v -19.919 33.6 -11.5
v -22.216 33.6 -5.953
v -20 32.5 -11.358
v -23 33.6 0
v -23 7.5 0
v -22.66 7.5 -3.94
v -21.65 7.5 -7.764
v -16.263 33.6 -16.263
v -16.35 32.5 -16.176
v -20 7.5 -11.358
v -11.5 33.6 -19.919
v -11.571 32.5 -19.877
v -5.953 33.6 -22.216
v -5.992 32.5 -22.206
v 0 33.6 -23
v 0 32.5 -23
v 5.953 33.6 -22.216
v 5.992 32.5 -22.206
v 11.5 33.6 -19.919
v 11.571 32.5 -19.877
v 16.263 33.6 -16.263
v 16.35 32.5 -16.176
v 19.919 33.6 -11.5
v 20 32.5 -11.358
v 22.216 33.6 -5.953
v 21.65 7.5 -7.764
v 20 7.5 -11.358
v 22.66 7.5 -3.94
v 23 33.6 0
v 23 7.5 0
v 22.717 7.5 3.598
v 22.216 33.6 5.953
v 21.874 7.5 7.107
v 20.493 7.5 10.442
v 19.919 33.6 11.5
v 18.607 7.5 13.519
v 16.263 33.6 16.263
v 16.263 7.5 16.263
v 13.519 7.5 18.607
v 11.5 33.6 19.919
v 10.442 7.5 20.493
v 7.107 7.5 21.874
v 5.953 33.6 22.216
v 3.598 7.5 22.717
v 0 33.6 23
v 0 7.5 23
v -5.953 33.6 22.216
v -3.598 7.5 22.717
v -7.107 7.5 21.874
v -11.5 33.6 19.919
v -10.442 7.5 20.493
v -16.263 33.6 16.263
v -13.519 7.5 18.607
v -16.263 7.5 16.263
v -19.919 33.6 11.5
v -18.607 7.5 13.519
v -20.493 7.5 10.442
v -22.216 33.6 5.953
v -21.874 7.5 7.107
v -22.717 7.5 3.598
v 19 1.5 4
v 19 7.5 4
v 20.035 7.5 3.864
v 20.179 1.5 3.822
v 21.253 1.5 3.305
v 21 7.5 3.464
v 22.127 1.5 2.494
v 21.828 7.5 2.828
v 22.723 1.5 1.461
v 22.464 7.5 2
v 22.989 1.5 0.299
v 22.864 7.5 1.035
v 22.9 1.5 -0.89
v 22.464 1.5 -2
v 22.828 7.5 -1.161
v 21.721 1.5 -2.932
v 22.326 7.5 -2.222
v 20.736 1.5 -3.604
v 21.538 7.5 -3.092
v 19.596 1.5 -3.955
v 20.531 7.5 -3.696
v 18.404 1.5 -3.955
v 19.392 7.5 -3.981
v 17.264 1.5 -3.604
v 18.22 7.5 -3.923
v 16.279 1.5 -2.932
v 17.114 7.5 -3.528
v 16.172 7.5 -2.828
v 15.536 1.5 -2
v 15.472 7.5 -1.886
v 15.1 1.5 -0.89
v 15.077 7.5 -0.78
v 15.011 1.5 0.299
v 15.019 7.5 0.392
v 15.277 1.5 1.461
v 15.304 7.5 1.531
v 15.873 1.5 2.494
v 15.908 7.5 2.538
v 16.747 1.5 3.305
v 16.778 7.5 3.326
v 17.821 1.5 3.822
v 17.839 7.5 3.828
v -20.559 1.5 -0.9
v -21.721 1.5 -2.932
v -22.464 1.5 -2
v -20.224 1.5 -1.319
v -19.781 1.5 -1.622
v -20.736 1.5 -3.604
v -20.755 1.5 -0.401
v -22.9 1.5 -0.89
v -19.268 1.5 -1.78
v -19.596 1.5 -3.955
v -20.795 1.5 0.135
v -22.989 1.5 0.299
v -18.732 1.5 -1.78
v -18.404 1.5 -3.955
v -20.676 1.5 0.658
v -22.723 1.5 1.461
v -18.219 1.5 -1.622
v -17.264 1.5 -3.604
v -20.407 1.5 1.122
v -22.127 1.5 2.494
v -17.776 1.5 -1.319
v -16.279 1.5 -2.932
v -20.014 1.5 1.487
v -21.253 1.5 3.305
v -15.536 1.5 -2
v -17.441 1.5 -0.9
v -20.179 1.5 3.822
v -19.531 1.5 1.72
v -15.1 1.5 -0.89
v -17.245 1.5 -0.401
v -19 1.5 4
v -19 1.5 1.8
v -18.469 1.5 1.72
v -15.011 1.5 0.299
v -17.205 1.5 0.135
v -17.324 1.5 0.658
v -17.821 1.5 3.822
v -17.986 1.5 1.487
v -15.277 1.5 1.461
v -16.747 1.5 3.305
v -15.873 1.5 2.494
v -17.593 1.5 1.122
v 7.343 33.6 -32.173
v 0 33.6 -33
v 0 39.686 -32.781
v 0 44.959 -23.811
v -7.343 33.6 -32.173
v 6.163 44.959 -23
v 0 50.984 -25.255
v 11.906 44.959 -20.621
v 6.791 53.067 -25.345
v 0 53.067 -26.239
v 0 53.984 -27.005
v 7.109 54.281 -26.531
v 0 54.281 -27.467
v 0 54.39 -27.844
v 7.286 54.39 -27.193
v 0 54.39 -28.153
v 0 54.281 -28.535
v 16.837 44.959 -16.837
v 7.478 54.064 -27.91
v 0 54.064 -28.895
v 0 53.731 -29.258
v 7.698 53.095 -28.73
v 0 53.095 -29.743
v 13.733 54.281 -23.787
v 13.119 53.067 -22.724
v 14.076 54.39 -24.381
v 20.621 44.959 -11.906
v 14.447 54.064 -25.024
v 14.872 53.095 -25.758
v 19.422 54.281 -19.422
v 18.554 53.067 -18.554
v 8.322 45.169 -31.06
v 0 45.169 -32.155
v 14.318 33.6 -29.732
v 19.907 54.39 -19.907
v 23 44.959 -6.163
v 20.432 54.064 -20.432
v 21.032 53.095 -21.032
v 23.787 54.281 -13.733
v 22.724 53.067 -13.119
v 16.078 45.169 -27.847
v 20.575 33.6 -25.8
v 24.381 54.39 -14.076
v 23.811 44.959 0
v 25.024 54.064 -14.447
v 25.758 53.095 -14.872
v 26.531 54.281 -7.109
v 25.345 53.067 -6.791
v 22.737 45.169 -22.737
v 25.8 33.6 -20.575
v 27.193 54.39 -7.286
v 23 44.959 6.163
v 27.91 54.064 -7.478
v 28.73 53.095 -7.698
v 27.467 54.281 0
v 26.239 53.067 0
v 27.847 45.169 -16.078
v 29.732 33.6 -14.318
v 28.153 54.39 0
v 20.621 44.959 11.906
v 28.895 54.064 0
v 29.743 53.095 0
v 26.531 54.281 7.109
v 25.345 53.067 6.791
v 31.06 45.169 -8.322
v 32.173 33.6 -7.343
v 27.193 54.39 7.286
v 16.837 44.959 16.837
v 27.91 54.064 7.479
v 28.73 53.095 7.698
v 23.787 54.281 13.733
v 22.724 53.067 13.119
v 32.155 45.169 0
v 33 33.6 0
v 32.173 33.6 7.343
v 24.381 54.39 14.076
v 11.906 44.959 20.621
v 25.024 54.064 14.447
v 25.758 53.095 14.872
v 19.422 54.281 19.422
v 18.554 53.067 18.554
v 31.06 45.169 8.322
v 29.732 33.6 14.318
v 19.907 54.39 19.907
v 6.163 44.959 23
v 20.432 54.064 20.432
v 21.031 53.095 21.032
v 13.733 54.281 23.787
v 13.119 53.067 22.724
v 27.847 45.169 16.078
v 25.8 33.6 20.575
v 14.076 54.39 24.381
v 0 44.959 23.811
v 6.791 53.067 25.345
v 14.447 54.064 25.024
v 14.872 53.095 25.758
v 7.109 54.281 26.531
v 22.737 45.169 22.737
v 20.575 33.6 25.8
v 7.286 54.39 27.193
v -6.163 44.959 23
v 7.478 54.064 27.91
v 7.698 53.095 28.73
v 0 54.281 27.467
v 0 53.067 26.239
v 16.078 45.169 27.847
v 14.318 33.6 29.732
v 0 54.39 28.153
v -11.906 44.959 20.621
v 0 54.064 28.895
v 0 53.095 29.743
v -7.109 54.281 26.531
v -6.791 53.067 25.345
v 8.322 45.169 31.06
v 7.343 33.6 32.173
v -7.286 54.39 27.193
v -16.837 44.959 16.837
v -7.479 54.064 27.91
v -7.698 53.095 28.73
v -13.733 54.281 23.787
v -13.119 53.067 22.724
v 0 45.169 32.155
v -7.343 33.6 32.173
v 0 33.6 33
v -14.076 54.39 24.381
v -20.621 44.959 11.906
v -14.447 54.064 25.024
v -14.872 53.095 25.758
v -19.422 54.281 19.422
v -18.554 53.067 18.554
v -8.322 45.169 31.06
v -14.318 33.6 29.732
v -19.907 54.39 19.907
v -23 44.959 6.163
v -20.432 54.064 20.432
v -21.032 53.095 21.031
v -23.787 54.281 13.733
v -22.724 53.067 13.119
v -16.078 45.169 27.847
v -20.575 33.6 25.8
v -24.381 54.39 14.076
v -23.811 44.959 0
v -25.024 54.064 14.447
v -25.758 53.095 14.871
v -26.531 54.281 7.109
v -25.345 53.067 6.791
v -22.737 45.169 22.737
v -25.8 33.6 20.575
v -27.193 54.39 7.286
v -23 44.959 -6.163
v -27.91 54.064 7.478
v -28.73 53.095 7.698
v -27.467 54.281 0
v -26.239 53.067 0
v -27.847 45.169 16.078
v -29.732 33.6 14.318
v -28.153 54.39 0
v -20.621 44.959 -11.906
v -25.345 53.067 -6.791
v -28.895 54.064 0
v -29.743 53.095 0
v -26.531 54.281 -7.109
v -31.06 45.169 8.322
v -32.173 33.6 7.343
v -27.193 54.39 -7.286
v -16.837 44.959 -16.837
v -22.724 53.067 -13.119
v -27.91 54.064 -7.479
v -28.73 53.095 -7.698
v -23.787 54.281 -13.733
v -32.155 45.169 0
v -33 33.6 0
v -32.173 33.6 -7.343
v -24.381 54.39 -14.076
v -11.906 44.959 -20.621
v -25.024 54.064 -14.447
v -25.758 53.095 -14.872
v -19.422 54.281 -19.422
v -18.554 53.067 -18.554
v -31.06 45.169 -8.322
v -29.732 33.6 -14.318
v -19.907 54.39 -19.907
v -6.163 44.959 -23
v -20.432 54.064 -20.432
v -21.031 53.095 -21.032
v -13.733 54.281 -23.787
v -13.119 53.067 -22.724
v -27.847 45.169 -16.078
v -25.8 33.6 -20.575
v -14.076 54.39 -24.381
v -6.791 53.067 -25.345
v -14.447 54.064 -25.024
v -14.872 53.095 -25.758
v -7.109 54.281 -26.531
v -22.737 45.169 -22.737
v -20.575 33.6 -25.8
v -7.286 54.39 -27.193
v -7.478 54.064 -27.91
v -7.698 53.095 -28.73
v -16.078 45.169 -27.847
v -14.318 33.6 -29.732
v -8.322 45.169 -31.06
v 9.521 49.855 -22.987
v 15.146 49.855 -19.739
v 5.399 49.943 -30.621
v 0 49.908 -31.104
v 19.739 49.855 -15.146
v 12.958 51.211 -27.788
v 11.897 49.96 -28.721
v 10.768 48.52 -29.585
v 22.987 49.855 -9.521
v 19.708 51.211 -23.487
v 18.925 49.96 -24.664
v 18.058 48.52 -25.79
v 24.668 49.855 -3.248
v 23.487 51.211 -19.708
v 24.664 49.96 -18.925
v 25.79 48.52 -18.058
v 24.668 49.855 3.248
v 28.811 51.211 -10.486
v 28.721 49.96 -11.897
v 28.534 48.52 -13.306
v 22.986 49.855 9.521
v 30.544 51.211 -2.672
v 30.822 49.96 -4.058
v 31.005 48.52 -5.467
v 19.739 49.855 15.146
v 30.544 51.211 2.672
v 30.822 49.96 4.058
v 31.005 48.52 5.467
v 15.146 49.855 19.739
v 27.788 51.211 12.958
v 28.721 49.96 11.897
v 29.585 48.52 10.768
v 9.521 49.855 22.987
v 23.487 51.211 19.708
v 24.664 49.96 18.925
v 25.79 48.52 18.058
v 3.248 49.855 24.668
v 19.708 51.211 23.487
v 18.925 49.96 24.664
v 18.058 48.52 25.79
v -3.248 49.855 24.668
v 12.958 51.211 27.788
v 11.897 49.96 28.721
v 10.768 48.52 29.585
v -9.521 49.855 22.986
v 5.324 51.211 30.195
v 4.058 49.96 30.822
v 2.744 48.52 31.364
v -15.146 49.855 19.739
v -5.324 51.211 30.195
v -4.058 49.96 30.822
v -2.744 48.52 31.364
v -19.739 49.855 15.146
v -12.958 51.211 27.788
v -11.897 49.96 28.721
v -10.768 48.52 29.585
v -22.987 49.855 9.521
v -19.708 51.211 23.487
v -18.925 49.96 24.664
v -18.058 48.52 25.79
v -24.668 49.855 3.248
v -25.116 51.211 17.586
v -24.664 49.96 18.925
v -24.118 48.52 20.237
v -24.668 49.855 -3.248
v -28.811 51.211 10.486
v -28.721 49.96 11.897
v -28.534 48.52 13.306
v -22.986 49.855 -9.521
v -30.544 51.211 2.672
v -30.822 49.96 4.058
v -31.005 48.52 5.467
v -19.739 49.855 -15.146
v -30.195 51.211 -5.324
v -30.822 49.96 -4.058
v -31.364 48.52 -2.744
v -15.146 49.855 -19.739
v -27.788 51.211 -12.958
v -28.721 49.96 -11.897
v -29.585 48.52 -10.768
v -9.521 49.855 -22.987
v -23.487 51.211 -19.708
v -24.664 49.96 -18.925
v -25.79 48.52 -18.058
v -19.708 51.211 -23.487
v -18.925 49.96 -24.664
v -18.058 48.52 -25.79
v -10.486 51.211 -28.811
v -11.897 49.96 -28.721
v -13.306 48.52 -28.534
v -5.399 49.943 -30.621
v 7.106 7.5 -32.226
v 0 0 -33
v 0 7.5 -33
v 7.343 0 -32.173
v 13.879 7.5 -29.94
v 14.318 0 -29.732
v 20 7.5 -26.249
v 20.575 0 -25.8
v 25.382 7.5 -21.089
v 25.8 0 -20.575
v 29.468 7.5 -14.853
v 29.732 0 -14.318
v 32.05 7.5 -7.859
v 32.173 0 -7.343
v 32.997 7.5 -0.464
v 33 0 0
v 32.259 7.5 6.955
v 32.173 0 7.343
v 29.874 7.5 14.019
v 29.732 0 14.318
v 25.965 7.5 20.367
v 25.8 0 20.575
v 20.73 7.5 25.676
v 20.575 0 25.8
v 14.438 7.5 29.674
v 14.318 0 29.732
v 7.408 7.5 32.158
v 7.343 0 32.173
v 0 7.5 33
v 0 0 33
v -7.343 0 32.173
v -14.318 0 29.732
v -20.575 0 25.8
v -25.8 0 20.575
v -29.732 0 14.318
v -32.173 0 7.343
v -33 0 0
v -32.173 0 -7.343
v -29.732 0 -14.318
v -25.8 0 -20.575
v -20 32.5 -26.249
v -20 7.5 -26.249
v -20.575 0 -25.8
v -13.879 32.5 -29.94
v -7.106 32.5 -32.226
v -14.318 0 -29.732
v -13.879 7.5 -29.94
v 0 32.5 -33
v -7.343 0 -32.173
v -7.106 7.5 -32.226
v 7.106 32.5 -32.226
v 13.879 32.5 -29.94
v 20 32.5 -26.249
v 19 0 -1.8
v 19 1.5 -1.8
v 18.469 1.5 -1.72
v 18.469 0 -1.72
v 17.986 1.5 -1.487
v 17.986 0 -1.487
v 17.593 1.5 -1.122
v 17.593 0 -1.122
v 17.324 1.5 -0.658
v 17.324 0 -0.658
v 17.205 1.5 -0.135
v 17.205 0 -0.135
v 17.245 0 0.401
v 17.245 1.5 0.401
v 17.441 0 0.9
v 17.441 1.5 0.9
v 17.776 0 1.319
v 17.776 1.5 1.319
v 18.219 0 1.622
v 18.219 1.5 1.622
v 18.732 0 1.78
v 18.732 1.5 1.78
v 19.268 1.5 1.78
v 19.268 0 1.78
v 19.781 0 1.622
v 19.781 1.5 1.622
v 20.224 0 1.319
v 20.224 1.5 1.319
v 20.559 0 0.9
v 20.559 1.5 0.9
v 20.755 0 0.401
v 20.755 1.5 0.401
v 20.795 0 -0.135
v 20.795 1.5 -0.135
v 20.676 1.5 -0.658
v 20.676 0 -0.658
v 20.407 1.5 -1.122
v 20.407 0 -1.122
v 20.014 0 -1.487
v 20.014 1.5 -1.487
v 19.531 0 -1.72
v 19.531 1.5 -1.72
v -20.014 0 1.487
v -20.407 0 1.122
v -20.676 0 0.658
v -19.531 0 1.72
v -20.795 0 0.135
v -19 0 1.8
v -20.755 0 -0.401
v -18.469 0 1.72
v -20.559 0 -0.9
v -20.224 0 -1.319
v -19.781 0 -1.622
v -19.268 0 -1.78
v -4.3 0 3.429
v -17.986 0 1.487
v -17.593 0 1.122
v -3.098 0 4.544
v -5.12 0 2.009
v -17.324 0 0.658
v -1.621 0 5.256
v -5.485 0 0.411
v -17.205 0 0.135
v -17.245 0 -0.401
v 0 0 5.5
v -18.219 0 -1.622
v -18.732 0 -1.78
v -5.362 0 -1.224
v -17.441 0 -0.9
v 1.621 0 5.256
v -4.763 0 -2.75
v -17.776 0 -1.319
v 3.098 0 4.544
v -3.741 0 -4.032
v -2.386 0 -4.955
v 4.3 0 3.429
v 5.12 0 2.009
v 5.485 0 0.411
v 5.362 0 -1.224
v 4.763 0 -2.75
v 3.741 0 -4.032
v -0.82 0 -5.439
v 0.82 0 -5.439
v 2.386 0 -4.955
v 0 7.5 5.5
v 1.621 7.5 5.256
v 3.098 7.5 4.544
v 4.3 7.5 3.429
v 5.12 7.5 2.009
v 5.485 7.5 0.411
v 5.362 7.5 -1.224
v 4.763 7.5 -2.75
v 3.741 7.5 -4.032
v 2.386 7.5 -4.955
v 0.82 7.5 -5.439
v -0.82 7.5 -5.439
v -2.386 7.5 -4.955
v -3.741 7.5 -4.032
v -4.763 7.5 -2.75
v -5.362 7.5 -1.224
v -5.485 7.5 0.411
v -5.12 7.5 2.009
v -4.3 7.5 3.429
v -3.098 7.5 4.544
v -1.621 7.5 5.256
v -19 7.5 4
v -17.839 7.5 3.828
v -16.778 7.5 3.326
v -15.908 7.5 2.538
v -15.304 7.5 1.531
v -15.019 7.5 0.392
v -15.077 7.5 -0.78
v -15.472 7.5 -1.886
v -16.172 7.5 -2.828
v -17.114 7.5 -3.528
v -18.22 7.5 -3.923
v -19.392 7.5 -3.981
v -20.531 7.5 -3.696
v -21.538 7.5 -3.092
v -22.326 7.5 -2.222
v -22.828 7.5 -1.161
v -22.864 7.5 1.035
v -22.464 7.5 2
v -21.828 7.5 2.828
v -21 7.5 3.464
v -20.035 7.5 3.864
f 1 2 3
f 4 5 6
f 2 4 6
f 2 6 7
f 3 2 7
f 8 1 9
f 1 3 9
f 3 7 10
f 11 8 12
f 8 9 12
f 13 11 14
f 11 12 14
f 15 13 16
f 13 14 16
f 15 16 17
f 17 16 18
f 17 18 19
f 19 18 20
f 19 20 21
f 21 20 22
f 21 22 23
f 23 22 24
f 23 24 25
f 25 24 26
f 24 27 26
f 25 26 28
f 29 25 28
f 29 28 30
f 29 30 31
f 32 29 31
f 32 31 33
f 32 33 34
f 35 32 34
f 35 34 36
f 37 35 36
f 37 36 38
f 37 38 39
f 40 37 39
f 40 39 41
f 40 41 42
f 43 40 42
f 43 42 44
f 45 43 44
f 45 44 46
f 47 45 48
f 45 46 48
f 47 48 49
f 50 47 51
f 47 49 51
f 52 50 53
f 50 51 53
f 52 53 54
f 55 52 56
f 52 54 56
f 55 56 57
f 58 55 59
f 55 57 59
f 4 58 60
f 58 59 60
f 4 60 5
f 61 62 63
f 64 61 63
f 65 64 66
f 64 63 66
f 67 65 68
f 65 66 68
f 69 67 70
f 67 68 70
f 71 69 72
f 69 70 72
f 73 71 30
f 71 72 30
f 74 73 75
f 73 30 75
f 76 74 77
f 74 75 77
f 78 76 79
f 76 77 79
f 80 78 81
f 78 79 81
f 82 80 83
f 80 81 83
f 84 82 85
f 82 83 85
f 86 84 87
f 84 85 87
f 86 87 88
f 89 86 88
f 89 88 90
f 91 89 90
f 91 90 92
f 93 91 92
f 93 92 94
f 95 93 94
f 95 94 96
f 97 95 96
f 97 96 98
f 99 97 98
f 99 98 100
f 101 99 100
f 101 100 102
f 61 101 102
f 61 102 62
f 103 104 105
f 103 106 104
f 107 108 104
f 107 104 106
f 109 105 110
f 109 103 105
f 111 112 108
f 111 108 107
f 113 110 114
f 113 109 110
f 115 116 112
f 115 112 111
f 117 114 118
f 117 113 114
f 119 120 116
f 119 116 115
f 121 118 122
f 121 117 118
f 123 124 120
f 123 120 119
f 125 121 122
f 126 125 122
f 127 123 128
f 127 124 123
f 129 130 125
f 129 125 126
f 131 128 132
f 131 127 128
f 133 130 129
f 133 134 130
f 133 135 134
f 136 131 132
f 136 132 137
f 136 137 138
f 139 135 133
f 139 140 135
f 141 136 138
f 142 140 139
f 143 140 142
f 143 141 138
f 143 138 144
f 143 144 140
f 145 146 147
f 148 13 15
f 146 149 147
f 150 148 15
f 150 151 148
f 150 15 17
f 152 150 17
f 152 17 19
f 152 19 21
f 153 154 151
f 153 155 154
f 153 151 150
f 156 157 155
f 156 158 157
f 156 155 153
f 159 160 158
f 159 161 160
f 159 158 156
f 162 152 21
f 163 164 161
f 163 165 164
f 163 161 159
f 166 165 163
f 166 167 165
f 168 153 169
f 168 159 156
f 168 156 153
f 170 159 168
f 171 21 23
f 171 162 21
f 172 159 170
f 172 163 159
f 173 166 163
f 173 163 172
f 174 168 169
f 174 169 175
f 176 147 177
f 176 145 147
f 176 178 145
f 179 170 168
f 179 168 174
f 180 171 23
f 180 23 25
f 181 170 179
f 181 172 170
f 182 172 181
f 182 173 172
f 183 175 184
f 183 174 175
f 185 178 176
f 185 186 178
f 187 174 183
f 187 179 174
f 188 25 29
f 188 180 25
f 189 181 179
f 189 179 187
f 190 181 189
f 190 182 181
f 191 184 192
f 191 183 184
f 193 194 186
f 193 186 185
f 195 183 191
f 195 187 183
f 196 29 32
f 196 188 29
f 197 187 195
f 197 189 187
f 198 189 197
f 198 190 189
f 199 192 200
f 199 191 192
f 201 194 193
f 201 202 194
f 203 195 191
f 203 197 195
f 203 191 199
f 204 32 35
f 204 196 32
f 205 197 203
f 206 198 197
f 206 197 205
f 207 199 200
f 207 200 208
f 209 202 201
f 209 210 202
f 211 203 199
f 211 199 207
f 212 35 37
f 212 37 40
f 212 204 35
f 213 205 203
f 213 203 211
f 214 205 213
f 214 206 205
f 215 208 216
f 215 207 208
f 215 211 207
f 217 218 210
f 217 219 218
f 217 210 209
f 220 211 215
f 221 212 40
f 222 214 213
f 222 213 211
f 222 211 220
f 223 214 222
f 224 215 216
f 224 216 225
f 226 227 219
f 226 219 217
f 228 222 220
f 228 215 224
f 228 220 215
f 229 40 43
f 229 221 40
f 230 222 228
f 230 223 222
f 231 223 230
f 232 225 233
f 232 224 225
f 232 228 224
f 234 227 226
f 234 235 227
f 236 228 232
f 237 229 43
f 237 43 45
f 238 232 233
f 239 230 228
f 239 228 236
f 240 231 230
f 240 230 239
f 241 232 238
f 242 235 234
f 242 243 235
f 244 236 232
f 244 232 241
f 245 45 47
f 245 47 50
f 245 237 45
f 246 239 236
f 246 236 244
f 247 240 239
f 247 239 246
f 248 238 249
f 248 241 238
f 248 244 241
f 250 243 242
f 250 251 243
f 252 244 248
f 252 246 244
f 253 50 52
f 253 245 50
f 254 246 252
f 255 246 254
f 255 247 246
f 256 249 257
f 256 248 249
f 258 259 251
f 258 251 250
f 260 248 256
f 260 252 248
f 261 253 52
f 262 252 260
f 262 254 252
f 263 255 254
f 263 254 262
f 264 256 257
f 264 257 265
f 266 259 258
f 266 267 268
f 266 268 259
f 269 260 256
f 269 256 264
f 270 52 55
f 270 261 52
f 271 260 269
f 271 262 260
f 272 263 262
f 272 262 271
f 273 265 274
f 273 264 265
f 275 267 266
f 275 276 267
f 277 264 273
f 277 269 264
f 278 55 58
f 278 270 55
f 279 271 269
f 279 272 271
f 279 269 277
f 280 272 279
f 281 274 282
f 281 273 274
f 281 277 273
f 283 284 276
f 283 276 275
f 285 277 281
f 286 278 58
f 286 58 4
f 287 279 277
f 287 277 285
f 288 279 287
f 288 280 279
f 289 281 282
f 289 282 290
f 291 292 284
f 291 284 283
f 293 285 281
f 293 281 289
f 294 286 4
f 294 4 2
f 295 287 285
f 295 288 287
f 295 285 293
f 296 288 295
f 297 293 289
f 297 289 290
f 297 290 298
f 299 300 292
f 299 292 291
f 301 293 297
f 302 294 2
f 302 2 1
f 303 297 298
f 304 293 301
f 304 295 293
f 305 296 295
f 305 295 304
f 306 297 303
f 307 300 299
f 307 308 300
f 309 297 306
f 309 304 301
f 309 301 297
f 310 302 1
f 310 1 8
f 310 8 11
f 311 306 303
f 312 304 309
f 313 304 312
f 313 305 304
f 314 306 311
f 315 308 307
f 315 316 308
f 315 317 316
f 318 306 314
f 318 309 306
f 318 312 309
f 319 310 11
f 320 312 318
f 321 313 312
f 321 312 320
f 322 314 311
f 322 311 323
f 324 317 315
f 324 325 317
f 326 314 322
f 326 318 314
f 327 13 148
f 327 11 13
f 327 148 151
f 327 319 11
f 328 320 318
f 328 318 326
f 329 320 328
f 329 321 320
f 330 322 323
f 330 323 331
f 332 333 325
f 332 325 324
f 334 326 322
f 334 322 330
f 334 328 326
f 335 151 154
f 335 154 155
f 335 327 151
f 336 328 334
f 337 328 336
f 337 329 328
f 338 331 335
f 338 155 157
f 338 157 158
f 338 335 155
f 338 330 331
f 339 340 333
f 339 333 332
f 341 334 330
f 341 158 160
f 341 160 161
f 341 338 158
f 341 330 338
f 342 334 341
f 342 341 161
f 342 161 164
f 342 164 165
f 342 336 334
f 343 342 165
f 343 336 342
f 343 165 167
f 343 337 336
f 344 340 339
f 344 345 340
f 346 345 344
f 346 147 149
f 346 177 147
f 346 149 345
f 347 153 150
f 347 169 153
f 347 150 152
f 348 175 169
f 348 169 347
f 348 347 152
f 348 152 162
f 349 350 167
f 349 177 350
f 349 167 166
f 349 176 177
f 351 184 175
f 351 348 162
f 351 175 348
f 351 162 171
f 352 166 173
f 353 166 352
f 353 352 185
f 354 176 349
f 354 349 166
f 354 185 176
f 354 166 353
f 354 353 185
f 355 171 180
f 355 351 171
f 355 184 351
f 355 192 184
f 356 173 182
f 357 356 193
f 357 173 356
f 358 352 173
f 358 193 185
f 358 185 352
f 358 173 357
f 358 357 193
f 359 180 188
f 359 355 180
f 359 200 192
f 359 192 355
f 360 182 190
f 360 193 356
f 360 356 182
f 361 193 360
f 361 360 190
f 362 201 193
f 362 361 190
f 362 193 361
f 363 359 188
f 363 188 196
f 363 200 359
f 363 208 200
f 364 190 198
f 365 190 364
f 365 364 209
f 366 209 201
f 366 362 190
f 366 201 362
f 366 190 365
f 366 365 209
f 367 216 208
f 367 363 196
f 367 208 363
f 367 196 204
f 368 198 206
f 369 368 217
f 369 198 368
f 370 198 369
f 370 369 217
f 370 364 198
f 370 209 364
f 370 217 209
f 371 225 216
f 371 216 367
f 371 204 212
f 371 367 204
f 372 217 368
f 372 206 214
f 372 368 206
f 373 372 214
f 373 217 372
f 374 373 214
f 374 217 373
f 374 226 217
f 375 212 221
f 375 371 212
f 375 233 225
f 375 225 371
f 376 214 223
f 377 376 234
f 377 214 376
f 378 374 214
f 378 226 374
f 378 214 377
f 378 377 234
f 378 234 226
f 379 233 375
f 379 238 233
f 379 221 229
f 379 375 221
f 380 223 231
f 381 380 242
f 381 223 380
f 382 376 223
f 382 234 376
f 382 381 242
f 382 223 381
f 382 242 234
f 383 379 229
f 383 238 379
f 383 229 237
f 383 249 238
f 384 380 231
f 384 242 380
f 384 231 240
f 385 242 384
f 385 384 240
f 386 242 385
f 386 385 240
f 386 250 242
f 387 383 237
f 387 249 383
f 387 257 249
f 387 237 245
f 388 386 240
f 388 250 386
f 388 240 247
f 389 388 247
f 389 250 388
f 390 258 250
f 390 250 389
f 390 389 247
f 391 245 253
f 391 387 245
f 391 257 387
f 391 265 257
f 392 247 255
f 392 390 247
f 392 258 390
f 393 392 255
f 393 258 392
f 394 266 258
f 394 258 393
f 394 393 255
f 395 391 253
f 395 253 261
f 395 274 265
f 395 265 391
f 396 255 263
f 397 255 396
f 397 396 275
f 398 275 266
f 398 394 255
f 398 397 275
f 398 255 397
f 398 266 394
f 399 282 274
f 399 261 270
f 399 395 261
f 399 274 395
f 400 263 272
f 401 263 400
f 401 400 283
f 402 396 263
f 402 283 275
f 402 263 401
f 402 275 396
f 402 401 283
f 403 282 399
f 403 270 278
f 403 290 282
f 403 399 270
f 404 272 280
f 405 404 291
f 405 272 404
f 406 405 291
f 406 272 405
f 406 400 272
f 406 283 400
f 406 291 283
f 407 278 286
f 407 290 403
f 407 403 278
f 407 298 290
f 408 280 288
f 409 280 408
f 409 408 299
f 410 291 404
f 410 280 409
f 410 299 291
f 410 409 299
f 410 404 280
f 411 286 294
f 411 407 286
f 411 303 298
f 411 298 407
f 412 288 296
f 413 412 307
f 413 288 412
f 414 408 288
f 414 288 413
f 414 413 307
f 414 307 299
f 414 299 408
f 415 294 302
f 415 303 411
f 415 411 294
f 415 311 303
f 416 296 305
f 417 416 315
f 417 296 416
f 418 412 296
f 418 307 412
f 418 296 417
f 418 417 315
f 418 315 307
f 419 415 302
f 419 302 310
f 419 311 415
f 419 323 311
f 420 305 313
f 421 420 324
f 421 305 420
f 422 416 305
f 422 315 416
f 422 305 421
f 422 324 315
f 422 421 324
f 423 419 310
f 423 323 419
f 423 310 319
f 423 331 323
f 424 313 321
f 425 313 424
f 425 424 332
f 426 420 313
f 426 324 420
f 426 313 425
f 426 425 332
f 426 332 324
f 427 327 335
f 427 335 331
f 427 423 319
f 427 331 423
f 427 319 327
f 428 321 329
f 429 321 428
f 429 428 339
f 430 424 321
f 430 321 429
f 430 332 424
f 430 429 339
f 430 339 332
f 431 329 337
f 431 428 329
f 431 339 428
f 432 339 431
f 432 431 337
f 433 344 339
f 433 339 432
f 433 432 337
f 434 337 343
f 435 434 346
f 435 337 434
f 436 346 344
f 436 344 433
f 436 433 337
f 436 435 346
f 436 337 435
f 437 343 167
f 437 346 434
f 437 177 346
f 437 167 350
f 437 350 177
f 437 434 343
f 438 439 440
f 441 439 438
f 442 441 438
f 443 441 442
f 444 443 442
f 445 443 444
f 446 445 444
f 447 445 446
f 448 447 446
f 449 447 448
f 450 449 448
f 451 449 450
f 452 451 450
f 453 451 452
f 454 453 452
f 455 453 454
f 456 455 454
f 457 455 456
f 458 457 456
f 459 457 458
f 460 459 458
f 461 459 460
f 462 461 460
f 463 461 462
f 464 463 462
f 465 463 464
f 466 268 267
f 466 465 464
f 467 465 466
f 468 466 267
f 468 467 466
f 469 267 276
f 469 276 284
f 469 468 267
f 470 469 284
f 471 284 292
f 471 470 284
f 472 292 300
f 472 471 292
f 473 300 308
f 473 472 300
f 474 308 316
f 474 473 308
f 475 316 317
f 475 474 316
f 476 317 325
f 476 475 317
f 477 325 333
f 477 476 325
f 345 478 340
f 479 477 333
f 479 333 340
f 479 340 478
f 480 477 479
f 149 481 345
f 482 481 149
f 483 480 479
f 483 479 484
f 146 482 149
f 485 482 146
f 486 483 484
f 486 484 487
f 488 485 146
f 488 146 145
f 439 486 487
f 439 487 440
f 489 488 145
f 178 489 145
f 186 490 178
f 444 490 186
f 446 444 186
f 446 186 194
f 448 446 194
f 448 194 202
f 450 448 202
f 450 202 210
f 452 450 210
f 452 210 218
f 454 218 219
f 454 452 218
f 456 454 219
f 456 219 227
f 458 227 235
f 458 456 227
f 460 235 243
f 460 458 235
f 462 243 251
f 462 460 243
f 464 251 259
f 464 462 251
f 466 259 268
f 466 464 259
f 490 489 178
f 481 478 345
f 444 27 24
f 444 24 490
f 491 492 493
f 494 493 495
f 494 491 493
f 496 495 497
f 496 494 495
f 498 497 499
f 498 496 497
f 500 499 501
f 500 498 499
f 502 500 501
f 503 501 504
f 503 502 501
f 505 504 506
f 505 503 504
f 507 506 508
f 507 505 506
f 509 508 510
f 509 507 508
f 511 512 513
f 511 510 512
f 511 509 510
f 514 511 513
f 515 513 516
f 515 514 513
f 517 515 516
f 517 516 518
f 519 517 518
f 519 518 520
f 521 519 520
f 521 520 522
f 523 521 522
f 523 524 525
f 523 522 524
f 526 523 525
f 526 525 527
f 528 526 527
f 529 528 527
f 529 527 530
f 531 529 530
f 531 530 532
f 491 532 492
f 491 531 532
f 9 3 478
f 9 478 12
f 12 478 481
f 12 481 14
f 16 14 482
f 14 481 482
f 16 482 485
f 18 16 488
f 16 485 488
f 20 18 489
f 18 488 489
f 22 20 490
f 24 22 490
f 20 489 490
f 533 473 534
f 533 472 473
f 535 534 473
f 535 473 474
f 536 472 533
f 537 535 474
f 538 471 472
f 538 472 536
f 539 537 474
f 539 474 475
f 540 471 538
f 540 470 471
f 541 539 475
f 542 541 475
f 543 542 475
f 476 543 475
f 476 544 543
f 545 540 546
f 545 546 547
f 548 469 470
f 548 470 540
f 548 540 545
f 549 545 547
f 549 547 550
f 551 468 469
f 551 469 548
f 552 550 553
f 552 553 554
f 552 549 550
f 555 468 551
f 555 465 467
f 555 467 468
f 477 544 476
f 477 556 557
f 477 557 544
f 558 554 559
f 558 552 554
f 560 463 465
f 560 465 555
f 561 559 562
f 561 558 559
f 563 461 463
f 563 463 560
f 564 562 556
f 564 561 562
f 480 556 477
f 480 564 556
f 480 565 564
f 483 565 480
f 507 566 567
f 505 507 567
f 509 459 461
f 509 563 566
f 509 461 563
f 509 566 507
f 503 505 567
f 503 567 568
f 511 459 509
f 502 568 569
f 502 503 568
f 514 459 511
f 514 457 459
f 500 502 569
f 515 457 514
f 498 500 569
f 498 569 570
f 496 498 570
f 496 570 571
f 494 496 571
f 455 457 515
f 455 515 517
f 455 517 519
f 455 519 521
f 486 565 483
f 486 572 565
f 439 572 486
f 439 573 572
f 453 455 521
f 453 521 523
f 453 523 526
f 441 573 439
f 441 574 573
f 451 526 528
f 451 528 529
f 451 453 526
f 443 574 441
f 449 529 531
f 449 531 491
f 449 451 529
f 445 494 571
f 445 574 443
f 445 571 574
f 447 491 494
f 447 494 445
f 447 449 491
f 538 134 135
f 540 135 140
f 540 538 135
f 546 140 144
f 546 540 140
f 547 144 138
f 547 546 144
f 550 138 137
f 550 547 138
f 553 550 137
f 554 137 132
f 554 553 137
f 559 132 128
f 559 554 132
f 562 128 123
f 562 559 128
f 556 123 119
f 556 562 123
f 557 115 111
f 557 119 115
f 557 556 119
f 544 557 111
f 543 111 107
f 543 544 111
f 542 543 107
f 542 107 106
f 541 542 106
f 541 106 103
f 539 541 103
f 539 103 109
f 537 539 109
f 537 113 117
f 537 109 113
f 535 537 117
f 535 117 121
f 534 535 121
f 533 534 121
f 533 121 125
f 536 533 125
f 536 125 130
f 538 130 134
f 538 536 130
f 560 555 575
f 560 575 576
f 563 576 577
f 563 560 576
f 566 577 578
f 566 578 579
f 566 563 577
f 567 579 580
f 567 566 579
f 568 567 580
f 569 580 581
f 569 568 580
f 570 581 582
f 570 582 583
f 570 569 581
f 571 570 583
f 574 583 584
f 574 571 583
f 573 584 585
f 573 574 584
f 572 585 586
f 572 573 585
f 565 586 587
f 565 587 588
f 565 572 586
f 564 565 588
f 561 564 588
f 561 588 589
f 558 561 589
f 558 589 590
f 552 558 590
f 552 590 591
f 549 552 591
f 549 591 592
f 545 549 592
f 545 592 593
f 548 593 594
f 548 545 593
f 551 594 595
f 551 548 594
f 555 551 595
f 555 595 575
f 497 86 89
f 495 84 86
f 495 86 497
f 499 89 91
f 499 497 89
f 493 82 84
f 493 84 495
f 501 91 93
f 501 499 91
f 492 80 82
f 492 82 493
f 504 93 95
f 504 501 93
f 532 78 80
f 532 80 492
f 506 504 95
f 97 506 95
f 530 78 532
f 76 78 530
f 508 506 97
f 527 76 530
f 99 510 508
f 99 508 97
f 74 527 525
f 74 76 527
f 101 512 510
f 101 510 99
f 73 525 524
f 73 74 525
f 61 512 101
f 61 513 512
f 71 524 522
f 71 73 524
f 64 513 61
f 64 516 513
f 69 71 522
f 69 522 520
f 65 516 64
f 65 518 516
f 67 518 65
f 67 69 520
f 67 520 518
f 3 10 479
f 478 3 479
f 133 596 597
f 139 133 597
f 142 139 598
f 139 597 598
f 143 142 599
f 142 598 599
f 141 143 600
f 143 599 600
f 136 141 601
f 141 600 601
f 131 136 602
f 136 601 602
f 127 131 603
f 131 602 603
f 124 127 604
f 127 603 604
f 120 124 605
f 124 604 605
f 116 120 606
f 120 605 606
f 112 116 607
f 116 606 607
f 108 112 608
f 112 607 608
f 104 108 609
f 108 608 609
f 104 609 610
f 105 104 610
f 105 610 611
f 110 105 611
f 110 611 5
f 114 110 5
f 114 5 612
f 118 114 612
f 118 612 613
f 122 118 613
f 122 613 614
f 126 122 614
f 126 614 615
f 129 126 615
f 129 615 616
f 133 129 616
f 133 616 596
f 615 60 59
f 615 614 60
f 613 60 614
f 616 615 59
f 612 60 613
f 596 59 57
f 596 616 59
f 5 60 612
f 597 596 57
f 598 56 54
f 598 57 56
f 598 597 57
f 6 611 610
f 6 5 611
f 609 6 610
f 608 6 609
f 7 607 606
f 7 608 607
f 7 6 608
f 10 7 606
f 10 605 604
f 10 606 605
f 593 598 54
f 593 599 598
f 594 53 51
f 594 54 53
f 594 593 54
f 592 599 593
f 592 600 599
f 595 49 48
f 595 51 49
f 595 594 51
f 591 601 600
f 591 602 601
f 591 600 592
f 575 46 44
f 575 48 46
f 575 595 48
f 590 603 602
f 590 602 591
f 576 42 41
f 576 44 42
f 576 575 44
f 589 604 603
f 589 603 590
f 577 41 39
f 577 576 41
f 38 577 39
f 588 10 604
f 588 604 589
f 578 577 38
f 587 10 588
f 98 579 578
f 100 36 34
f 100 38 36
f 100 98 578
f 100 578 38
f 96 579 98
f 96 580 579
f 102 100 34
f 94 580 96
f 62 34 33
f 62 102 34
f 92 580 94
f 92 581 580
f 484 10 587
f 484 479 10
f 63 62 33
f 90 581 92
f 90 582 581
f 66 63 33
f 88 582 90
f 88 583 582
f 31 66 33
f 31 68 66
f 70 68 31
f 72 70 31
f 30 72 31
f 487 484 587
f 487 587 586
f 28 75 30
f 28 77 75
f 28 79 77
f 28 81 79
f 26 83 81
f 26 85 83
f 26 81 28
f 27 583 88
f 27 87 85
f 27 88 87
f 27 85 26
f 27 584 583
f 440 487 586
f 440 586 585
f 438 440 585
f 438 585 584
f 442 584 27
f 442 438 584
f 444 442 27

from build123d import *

# Parameters (mm, degrees)
SKETCH1_R           = 25
SKETCH1_R_2         = 1.8
SKETCH1_R_3         = 5.5
BOSS_EXTRUDE1_DEPTH = 7.5
SKETCH2_R           = 4
CUT_EXTRUDE1_DEPTH  = 6
BOSS_EXTRUDE2_START = -7.5
SKETCH3_R           = 33
SKETCH3_R_2         = 23
BOSS_EXTRUDE2_DEPTH = 47
SKETCH3_2_R         = 33
SKETCH3_2_R_2       = 23
BOSS_EXTRUDE3_DEPTH = 7.5
SKETCH7_W           = 40
SKETCH7_H           = 21.642183308
CUT_EXTRUDE3_DEPTH  = 25


with BuildPart() as part:
    # Sketch1 → Boss-Extrude1 (new body)
    with BuildSketch(Plane(origin=(0, 0, 0), x_dir=(1, 0, 0), z_dir=(0, 1, 0))):
        with Locations(Location((0, 0, 0), (0, 0, 270))):
            Circle(SKETCH1_R)
        with Locations(Location((-19, 0, 0), (0, 0, 270))):
            Circle(SKETCH1_R_2, mode=Mode.SUBTRACT)
        with Locations(Location((19, 0, 0), (0, 0, 90))):
            Circle(SKETCH1_R_2, mode=Mode.SUBTRACT)
        with Locations(Location((0, 0, 0), (0, 0, 270))):
            Circle(SKETCH1_R_3, mode=Mode.SUBTRACT)
    extrude(amount=BOSS_EXTRUDE1_DEPTH)

    # Sketch2 → Cut-Extrude1 (cut)
    with BuildSketch(Plane(origin=(0, 7.5, 0), x_dir=(1, 0, 0), z_dir=(0, 1, 0))):
        with Locations(Location((-19, 0, 0), (0, 0, 270))):
            Circle(SKETCH2_R)
        with Locations(Location((19, 0, 0), (0, 0, 270))):
            Circle(SKETCH2_R)
    extrude(amount=-CUT_EXTRUDE1_DEPTH, mode=Mode.SUBTRACT)

    # Sketch3 → Boss-Extrude2 (add)
    with BuildSketch(Plane.XZ.offset(BOSS_EXTRUDE2_START)):
        with Locations(Location((0, 0, 0), (0, 0, 90))):
            Circle(SKETCH3_R)
        with Locations(Location((0, 0, 0), (0, 0, 180.000077522))):
            Circle(SKETCH3_R_2, mode=Mode.SUBTRACT)
    extrude(amount=-BOSS_EXTRUDE2_DEPTH)

    # Sketch3<2> → Boss-Extrude3 (add)
    with BuildSketch(Plane.XZ):
        with Locations(Location((0, 0, 0), (0, 0, 270))):
            Circle(SKETCH3_2_R)
        with Locations(Location((0, 0, 0), (0, 0, 180.000077522))):
            Circle(SKETCH3_2_R_2, mode=Mode.SUBTRACT)
    extrude(amount=-BOSS_EXTRUDE3_DEPTH)

    # Sketch6 → Cut-Revolve7 (revolve, cut)
    with BuildSketch(Plane.XY, mode=Mode.PRIVATE) as cut_revolve7_sk:
        with BuildLine():
            Line((-33, 33.6), (-33, 54.5))
            Line((-33, 54.5), (-23, 54.5))
            Line((-23, 54.5), (-23, 33.6))
            add(Edge.make_bspline(
                [(-23, 33.6), (-23, 54.4), (-28, 54.4), (-33, 54.4), (-33, 33.6)],
                knots=[1.570796327, 1.570796327, 1.570796327, 3.141592654, 3.141592654, 4.71238898, 4.71238898, 4.71238898], degree=2, weights=[1, 0.707106781, 1, 0.707106781, 1]))
        make_face()
    revolve(cut_revolve7_sk.sketch.rotate(Axis((0, 54.5, 0), (0, -1, 0)), 90), axis=Axis((0, 54.5, 0), (0, -1, 0)), mode=Mode.SUBTRACT)

    # Sketch7 → Cut-Extrude3 (cut)
    with BuildSketch(Plane(origin=(0, 7.5, 0), x_dir=(1, 0, 0), z_dir=(0, 1, 0))):
        with Locations((0, 22.178908346)):
            Rectangle(SKETCH7_W, SKETCH7_H)
    extrude(amount=CUT_EXTRUDE3_DEPTH, mode=Mode.SUBTRACT)


solid = part.part
